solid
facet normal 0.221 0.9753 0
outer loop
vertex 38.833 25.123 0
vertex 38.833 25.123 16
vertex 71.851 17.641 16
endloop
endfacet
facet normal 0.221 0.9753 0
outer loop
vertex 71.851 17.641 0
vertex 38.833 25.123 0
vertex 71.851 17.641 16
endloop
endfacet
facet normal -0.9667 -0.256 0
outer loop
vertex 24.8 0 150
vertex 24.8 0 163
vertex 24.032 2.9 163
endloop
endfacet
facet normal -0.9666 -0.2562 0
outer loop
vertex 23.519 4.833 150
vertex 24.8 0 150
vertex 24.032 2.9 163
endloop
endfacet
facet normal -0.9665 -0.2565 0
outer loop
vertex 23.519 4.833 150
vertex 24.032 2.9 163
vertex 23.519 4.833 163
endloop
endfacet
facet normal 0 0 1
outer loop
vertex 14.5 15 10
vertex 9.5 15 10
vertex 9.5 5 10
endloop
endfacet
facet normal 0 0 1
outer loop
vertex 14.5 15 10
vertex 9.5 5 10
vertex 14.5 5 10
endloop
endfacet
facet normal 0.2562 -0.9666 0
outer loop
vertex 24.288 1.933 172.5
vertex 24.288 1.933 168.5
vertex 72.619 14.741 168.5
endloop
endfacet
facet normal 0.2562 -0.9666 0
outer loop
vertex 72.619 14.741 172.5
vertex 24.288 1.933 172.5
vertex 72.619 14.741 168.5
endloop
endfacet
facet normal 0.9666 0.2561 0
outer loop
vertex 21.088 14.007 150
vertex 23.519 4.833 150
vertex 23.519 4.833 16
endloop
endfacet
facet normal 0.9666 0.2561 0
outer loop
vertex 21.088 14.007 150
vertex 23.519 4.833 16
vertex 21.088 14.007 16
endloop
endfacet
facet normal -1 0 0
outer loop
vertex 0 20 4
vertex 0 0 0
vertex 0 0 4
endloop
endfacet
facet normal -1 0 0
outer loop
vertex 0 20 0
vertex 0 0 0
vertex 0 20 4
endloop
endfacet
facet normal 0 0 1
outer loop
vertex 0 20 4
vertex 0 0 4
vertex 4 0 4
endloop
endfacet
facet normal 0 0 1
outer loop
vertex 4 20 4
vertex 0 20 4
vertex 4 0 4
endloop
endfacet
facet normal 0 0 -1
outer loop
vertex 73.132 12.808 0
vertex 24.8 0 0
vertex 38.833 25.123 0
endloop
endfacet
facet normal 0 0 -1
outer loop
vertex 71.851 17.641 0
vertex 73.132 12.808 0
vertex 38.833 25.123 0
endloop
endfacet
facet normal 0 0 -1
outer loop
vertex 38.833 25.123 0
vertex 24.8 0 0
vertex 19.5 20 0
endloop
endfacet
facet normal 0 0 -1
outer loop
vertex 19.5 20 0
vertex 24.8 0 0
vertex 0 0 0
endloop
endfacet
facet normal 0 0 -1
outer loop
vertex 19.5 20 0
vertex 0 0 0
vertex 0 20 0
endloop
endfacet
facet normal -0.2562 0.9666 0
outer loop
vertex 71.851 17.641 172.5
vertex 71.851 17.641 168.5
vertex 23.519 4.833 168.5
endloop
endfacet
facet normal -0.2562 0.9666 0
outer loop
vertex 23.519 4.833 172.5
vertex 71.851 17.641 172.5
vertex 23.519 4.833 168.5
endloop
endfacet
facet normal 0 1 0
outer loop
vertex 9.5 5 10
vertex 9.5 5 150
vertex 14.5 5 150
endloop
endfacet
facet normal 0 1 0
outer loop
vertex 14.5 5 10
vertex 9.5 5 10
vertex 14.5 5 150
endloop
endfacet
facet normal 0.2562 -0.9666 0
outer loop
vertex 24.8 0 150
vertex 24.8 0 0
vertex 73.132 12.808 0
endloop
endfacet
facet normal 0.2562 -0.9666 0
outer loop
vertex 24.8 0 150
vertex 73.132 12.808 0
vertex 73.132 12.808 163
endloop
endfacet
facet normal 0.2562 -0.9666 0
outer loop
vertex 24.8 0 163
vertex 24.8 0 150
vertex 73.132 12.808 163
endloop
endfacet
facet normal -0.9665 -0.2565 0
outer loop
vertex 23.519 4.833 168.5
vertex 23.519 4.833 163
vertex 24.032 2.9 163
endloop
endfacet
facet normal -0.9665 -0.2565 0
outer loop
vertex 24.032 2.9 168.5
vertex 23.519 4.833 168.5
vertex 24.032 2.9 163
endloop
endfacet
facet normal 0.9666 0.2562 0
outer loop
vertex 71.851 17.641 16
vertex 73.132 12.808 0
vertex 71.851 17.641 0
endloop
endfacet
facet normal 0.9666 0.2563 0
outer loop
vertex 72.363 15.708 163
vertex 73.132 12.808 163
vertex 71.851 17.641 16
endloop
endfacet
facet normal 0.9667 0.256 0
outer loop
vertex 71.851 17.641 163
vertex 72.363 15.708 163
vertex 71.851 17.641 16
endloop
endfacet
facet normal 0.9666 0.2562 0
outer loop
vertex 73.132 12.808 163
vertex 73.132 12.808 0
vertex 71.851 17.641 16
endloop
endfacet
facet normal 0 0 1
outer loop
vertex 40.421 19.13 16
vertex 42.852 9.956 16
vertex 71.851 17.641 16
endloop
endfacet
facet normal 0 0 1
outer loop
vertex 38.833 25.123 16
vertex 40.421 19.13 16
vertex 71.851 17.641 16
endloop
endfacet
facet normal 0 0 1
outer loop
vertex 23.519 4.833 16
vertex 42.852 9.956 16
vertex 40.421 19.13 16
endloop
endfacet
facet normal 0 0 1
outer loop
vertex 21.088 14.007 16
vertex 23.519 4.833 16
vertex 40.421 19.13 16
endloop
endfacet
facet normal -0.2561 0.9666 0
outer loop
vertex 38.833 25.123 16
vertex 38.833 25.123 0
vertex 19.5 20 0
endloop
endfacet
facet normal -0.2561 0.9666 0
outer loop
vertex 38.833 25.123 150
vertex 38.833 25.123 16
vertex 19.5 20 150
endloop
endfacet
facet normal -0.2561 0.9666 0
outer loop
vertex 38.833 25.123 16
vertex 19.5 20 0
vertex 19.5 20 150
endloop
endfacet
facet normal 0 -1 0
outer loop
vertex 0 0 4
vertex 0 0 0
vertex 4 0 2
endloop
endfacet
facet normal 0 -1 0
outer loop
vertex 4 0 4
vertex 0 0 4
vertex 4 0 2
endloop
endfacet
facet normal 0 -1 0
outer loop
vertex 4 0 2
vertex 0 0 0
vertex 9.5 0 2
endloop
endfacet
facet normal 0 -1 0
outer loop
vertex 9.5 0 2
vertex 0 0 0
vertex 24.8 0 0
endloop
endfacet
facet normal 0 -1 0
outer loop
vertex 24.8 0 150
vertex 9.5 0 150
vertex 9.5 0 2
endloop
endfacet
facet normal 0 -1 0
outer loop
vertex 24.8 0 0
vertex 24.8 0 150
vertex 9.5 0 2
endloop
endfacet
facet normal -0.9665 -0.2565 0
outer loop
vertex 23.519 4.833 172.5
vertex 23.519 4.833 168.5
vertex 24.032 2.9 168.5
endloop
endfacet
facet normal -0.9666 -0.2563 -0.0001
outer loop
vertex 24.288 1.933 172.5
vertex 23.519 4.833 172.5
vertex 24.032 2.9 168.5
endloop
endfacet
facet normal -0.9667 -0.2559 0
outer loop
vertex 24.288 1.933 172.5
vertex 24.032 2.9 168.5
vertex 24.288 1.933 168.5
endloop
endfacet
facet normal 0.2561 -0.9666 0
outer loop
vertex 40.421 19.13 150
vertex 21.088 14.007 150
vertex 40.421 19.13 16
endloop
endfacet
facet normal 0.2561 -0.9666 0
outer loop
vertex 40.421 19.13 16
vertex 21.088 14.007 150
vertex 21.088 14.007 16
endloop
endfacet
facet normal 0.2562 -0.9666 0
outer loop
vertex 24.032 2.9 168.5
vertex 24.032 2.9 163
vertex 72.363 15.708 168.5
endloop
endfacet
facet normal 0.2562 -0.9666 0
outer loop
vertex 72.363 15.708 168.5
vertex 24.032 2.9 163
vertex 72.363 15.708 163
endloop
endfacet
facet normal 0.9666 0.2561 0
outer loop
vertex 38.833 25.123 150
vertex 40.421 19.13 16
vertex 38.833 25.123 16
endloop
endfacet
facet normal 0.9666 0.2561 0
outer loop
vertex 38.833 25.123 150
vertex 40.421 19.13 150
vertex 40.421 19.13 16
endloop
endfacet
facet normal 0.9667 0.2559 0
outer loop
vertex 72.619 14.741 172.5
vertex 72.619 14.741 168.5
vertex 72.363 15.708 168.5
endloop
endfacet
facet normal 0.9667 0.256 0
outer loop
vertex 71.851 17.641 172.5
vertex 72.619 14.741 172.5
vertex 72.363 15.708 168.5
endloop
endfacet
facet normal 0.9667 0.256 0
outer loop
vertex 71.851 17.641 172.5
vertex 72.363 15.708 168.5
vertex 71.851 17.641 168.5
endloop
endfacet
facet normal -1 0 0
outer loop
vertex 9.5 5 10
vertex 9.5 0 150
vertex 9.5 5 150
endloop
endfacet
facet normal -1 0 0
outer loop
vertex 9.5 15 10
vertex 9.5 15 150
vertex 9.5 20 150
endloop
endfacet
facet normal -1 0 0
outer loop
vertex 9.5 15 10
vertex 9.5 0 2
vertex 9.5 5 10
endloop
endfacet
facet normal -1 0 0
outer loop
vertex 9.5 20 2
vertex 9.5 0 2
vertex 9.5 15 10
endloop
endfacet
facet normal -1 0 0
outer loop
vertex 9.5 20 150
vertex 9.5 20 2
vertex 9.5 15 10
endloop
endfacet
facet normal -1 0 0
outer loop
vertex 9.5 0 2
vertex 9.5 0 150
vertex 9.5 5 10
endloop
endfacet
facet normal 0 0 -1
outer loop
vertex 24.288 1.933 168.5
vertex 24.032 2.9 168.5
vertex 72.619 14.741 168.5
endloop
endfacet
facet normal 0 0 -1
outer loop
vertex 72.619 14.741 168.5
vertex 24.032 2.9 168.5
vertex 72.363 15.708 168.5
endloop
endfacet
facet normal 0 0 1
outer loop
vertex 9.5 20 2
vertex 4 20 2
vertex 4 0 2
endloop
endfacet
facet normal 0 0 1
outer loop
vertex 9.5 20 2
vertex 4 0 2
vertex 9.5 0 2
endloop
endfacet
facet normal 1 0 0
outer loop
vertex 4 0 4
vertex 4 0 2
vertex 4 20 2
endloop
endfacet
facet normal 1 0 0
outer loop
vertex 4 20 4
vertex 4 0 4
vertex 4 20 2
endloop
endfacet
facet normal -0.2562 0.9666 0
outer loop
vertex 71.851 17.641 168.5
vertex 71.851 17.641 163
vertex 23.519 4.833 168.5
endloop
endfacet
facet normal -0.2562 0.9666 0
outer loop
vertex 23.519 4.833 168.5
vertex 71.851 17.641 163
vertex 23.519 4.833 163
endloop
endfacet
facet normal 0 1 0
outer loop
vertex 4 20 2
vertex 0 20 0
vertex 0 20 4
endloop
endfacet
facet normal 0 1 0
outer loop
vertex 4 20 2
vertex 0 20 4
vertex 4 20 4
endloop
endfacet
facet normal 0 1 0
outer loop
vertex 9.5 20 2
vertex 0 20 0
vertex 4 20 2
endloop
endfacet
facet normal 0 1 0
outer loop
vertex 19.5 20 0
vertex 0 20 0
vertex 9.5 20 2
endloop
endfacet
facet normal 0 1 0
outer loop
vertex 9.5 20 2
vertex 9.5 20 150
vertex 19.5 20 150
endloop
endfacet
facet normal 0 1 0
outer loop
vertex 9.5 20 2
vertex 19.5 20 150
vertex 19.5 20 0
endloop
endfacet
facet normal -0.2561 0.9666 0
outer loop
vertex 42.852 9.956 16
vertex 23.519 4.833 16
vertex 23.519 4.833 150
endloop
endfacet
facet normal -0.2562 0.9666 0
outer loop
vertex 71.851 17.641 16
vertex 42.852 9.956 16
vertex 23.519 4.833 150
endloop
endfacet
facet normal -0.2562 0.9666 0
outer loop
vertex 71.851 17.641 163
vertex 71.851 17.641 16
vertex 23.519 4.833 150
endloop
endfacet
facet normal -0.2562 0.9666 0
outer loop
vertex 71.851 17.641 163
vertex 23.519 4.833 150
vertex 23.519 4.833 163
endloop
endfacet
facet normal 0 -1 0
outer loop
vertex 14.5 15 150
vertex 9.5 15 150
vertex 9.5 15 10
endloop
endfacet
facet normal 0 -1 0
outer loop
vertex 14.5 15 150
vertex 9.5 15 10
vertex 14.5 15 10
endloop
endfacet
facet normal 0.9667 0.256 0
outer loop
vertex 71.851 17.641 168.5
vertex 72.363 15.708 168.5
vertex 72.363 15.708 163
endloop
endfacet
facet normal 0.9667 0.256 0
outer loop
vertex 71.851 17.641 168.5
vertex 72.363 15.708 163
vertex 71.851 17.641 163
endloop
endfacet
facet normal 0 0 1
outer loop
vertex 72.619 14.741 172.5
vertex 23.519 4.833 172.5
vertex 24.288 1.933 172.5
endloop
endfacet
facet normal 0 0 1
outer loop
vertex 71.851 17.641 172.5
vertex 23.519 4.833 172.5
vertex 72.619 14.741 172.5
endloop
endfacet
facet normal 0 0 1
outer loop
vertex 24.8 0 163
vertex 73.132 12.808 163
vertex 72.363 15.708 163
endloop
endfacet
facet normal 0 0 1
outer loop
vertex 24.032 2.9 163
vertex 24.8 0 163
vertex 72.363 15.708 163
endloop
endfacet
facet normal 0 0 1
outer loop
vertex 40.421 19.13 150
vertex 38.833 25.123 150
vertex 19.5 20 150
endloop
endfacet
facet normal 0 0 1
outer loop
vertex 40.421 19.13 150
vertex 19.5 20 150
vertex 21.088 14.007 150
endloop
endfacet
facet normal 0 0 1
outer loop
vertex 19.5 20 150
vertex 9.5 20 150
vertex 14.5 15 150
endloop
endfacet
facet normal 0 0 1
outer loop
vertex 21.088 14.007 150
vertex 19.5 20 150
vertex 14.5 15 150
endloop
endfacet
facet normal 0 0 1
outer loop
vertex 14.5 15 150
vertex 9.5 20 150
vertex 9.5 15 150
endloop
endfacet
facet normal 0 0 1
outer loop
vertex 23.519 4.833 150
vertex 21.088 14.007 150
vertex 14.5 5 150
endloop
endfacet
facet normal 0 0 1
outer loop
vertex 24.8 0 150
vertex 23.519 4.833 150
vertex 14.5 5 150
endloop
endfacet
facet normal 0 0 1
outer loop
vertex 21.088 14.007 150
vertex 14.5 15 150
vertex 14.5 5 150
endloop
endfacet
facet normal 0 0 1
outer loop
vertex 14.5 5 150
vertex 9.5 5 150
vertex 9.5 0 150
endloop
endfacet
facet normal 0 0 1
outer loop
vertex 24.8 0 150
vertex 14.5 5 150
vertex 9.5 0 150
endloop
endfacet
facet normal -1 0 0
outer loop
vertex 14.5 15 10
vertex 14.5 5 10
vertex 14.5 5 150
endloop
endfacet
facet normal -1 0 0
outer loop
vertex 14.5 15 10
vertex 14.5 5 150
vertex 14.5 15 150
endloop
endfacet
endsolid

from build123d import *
from build123d import SkipClean  # not in build123d's __all__

# Parameters (mm, degrees)
F0_W      = 4
F0_H      = 20
F1_DEPTH  = 4
F2_W      = 5.5
F2_H      = 20
F3_DEPTH  = 2
F4_W      = 5
F4_H      = 20
F5_DEPTH  = 10
F6_W      = 5
F6_H      = 20
F7_DEPTH  = 150
F8_W      = 5
F8_H      = 5
F9_DEPTH  = 140
F10_W     = 5
F10_H     = 163
F11_DEPTH = 50
F12_W     = 9.4903359083
F12_H     = 16
F13_DEPTH = 20
F14_W     = 15.6903359083
F14_H     = 16
F15_DEPTH = 30
F17_DEPTH = 16
F19_DEPTH = 5.5
F21_DEPTH = 4


with BuildPart() as f1:
    # F0 (on Top) → F1 (new body)
    with BuildSketch(Plane.XY):
        with Locations((2, 10)):
            Rectangle(F0_W, F0_H)
    extrude(amount=F1_DEPTH)

    # F2 (on Top) → F3 (join)
    with BuildSketch(Plane.XY):
        with Locations((6.75, 10)):
            Rectangle(F2_W, F2_H)
    extrude(amount=F3_DEPTH)

    # F4 (on Top) → F5 (join)
    with BuildSketch(Plane.XY):
        with Locations((12, 10)):
            Rectangle(F4_W, F4_H)
    extrude(amount=F5_DEPTH)

    # F6 (on Top) → F7 (join)
    with BuildSketch(Plane.XY):
        with Locations((17, 10)):
            Rectangle(F6_W, F6_H)
        Polygon((24.8, 0), (19.5, 20), (19.5, 0), align=None)
    extrude(amount=F7_DEPTH)

    # F8 (on face) → F9 (join)
    with BuildSketch(Plane.XY.offset(10)):
        with Locations((12, 17.5)):
            Rectangle(F8_W, F8_H)
        with Locations((12, 2.5)):
            Rectangle(F8_W, F8_H)
    extrude(amount=F9_DEPTH)

    # F10 (on face) → F11 (join)
    with BuildSketch(Plane(origin=(23.17269733, 6.1407647925, 0), x_dir=(-0.2561582385, 0.9666348622, 0), z_dir=(0.9666348622, 0.2561582385, 0))):
        with Locations((-3.8527243145, 81.5)):
            Rectangle(F10_W, F10_H)
    extrude(amount=F11_DEPTH)

    # F12 (on face) → F13 (join)
    with BuildSketch(Plane(origin=(23.17269733, 6.1407647925, 0), x_dir=(-0.2561582385, 0.9666348622, 0), z_dir=(0.9666348622, 0.2561582385, 0))):
        Polygon((14.3376115938, 0), (14.3376115938, 150), (8.1376115938, 150), (8.1376115938, 16), (8.1376115938, 0), align=None)
        with Locations((3.3924436397, 8)):
            Rectangle(F12_W, F12_H)
    extrude(amount=F13_DEPTH)

    # F14 (on face) → F15 (join)
    with BuildSketch(Plane(origin=(42.5053945744, 11.2639295622, 0), x_dir=(-0.2561582385, 0.9666348622, 0), z_dir=(0.9666348622, 0.2561582385, 0))):
        with Locations((6.4924436397, 8)):
            Rectangle(F14_W, F14_H)
    extrude(amount=F15_DEPTH)

    # F16 (on face) → F17 (cut)
    with BuildSketch(Plane.XY.offset(16)):
        Polygon((67.8317431109, 32.8079119244), (38.8326972444, 25.1231647698), (71.8509519185, 17.6410862355), align=None)
    extrude(amount=-F17_DEPTH, mode=Mode.SUBTRACT)

    # F18 (on face) → F19 (join)
    with BuildSketch(Plane.XY.offset(163)):
        Polygon((71.8509519185, 17.6410862355), (23.5192088076, 4.8331743111), (24.0315252845, 2.8999045867), (72.3632683954, 15.707816511), align=None)
    extrude(amount=F19_DEPTH)

    # F20 (on face) → F21 (join)
    with BuildSketch(Plane.XY.offset(168.5)):
        Polygon((71.8509515411, 17.6410861355), (23.5192088076, 4.8331743111), (24.287683523, 1.9332697244), (72.6194262566, 14.7411815488), align=None)
    with SkipClean():  # cleaning this boolean's faces spoils the solid; the shape is the same uncleaned
        extrude(amount=F21_DEPTH)


solid = f1.part
